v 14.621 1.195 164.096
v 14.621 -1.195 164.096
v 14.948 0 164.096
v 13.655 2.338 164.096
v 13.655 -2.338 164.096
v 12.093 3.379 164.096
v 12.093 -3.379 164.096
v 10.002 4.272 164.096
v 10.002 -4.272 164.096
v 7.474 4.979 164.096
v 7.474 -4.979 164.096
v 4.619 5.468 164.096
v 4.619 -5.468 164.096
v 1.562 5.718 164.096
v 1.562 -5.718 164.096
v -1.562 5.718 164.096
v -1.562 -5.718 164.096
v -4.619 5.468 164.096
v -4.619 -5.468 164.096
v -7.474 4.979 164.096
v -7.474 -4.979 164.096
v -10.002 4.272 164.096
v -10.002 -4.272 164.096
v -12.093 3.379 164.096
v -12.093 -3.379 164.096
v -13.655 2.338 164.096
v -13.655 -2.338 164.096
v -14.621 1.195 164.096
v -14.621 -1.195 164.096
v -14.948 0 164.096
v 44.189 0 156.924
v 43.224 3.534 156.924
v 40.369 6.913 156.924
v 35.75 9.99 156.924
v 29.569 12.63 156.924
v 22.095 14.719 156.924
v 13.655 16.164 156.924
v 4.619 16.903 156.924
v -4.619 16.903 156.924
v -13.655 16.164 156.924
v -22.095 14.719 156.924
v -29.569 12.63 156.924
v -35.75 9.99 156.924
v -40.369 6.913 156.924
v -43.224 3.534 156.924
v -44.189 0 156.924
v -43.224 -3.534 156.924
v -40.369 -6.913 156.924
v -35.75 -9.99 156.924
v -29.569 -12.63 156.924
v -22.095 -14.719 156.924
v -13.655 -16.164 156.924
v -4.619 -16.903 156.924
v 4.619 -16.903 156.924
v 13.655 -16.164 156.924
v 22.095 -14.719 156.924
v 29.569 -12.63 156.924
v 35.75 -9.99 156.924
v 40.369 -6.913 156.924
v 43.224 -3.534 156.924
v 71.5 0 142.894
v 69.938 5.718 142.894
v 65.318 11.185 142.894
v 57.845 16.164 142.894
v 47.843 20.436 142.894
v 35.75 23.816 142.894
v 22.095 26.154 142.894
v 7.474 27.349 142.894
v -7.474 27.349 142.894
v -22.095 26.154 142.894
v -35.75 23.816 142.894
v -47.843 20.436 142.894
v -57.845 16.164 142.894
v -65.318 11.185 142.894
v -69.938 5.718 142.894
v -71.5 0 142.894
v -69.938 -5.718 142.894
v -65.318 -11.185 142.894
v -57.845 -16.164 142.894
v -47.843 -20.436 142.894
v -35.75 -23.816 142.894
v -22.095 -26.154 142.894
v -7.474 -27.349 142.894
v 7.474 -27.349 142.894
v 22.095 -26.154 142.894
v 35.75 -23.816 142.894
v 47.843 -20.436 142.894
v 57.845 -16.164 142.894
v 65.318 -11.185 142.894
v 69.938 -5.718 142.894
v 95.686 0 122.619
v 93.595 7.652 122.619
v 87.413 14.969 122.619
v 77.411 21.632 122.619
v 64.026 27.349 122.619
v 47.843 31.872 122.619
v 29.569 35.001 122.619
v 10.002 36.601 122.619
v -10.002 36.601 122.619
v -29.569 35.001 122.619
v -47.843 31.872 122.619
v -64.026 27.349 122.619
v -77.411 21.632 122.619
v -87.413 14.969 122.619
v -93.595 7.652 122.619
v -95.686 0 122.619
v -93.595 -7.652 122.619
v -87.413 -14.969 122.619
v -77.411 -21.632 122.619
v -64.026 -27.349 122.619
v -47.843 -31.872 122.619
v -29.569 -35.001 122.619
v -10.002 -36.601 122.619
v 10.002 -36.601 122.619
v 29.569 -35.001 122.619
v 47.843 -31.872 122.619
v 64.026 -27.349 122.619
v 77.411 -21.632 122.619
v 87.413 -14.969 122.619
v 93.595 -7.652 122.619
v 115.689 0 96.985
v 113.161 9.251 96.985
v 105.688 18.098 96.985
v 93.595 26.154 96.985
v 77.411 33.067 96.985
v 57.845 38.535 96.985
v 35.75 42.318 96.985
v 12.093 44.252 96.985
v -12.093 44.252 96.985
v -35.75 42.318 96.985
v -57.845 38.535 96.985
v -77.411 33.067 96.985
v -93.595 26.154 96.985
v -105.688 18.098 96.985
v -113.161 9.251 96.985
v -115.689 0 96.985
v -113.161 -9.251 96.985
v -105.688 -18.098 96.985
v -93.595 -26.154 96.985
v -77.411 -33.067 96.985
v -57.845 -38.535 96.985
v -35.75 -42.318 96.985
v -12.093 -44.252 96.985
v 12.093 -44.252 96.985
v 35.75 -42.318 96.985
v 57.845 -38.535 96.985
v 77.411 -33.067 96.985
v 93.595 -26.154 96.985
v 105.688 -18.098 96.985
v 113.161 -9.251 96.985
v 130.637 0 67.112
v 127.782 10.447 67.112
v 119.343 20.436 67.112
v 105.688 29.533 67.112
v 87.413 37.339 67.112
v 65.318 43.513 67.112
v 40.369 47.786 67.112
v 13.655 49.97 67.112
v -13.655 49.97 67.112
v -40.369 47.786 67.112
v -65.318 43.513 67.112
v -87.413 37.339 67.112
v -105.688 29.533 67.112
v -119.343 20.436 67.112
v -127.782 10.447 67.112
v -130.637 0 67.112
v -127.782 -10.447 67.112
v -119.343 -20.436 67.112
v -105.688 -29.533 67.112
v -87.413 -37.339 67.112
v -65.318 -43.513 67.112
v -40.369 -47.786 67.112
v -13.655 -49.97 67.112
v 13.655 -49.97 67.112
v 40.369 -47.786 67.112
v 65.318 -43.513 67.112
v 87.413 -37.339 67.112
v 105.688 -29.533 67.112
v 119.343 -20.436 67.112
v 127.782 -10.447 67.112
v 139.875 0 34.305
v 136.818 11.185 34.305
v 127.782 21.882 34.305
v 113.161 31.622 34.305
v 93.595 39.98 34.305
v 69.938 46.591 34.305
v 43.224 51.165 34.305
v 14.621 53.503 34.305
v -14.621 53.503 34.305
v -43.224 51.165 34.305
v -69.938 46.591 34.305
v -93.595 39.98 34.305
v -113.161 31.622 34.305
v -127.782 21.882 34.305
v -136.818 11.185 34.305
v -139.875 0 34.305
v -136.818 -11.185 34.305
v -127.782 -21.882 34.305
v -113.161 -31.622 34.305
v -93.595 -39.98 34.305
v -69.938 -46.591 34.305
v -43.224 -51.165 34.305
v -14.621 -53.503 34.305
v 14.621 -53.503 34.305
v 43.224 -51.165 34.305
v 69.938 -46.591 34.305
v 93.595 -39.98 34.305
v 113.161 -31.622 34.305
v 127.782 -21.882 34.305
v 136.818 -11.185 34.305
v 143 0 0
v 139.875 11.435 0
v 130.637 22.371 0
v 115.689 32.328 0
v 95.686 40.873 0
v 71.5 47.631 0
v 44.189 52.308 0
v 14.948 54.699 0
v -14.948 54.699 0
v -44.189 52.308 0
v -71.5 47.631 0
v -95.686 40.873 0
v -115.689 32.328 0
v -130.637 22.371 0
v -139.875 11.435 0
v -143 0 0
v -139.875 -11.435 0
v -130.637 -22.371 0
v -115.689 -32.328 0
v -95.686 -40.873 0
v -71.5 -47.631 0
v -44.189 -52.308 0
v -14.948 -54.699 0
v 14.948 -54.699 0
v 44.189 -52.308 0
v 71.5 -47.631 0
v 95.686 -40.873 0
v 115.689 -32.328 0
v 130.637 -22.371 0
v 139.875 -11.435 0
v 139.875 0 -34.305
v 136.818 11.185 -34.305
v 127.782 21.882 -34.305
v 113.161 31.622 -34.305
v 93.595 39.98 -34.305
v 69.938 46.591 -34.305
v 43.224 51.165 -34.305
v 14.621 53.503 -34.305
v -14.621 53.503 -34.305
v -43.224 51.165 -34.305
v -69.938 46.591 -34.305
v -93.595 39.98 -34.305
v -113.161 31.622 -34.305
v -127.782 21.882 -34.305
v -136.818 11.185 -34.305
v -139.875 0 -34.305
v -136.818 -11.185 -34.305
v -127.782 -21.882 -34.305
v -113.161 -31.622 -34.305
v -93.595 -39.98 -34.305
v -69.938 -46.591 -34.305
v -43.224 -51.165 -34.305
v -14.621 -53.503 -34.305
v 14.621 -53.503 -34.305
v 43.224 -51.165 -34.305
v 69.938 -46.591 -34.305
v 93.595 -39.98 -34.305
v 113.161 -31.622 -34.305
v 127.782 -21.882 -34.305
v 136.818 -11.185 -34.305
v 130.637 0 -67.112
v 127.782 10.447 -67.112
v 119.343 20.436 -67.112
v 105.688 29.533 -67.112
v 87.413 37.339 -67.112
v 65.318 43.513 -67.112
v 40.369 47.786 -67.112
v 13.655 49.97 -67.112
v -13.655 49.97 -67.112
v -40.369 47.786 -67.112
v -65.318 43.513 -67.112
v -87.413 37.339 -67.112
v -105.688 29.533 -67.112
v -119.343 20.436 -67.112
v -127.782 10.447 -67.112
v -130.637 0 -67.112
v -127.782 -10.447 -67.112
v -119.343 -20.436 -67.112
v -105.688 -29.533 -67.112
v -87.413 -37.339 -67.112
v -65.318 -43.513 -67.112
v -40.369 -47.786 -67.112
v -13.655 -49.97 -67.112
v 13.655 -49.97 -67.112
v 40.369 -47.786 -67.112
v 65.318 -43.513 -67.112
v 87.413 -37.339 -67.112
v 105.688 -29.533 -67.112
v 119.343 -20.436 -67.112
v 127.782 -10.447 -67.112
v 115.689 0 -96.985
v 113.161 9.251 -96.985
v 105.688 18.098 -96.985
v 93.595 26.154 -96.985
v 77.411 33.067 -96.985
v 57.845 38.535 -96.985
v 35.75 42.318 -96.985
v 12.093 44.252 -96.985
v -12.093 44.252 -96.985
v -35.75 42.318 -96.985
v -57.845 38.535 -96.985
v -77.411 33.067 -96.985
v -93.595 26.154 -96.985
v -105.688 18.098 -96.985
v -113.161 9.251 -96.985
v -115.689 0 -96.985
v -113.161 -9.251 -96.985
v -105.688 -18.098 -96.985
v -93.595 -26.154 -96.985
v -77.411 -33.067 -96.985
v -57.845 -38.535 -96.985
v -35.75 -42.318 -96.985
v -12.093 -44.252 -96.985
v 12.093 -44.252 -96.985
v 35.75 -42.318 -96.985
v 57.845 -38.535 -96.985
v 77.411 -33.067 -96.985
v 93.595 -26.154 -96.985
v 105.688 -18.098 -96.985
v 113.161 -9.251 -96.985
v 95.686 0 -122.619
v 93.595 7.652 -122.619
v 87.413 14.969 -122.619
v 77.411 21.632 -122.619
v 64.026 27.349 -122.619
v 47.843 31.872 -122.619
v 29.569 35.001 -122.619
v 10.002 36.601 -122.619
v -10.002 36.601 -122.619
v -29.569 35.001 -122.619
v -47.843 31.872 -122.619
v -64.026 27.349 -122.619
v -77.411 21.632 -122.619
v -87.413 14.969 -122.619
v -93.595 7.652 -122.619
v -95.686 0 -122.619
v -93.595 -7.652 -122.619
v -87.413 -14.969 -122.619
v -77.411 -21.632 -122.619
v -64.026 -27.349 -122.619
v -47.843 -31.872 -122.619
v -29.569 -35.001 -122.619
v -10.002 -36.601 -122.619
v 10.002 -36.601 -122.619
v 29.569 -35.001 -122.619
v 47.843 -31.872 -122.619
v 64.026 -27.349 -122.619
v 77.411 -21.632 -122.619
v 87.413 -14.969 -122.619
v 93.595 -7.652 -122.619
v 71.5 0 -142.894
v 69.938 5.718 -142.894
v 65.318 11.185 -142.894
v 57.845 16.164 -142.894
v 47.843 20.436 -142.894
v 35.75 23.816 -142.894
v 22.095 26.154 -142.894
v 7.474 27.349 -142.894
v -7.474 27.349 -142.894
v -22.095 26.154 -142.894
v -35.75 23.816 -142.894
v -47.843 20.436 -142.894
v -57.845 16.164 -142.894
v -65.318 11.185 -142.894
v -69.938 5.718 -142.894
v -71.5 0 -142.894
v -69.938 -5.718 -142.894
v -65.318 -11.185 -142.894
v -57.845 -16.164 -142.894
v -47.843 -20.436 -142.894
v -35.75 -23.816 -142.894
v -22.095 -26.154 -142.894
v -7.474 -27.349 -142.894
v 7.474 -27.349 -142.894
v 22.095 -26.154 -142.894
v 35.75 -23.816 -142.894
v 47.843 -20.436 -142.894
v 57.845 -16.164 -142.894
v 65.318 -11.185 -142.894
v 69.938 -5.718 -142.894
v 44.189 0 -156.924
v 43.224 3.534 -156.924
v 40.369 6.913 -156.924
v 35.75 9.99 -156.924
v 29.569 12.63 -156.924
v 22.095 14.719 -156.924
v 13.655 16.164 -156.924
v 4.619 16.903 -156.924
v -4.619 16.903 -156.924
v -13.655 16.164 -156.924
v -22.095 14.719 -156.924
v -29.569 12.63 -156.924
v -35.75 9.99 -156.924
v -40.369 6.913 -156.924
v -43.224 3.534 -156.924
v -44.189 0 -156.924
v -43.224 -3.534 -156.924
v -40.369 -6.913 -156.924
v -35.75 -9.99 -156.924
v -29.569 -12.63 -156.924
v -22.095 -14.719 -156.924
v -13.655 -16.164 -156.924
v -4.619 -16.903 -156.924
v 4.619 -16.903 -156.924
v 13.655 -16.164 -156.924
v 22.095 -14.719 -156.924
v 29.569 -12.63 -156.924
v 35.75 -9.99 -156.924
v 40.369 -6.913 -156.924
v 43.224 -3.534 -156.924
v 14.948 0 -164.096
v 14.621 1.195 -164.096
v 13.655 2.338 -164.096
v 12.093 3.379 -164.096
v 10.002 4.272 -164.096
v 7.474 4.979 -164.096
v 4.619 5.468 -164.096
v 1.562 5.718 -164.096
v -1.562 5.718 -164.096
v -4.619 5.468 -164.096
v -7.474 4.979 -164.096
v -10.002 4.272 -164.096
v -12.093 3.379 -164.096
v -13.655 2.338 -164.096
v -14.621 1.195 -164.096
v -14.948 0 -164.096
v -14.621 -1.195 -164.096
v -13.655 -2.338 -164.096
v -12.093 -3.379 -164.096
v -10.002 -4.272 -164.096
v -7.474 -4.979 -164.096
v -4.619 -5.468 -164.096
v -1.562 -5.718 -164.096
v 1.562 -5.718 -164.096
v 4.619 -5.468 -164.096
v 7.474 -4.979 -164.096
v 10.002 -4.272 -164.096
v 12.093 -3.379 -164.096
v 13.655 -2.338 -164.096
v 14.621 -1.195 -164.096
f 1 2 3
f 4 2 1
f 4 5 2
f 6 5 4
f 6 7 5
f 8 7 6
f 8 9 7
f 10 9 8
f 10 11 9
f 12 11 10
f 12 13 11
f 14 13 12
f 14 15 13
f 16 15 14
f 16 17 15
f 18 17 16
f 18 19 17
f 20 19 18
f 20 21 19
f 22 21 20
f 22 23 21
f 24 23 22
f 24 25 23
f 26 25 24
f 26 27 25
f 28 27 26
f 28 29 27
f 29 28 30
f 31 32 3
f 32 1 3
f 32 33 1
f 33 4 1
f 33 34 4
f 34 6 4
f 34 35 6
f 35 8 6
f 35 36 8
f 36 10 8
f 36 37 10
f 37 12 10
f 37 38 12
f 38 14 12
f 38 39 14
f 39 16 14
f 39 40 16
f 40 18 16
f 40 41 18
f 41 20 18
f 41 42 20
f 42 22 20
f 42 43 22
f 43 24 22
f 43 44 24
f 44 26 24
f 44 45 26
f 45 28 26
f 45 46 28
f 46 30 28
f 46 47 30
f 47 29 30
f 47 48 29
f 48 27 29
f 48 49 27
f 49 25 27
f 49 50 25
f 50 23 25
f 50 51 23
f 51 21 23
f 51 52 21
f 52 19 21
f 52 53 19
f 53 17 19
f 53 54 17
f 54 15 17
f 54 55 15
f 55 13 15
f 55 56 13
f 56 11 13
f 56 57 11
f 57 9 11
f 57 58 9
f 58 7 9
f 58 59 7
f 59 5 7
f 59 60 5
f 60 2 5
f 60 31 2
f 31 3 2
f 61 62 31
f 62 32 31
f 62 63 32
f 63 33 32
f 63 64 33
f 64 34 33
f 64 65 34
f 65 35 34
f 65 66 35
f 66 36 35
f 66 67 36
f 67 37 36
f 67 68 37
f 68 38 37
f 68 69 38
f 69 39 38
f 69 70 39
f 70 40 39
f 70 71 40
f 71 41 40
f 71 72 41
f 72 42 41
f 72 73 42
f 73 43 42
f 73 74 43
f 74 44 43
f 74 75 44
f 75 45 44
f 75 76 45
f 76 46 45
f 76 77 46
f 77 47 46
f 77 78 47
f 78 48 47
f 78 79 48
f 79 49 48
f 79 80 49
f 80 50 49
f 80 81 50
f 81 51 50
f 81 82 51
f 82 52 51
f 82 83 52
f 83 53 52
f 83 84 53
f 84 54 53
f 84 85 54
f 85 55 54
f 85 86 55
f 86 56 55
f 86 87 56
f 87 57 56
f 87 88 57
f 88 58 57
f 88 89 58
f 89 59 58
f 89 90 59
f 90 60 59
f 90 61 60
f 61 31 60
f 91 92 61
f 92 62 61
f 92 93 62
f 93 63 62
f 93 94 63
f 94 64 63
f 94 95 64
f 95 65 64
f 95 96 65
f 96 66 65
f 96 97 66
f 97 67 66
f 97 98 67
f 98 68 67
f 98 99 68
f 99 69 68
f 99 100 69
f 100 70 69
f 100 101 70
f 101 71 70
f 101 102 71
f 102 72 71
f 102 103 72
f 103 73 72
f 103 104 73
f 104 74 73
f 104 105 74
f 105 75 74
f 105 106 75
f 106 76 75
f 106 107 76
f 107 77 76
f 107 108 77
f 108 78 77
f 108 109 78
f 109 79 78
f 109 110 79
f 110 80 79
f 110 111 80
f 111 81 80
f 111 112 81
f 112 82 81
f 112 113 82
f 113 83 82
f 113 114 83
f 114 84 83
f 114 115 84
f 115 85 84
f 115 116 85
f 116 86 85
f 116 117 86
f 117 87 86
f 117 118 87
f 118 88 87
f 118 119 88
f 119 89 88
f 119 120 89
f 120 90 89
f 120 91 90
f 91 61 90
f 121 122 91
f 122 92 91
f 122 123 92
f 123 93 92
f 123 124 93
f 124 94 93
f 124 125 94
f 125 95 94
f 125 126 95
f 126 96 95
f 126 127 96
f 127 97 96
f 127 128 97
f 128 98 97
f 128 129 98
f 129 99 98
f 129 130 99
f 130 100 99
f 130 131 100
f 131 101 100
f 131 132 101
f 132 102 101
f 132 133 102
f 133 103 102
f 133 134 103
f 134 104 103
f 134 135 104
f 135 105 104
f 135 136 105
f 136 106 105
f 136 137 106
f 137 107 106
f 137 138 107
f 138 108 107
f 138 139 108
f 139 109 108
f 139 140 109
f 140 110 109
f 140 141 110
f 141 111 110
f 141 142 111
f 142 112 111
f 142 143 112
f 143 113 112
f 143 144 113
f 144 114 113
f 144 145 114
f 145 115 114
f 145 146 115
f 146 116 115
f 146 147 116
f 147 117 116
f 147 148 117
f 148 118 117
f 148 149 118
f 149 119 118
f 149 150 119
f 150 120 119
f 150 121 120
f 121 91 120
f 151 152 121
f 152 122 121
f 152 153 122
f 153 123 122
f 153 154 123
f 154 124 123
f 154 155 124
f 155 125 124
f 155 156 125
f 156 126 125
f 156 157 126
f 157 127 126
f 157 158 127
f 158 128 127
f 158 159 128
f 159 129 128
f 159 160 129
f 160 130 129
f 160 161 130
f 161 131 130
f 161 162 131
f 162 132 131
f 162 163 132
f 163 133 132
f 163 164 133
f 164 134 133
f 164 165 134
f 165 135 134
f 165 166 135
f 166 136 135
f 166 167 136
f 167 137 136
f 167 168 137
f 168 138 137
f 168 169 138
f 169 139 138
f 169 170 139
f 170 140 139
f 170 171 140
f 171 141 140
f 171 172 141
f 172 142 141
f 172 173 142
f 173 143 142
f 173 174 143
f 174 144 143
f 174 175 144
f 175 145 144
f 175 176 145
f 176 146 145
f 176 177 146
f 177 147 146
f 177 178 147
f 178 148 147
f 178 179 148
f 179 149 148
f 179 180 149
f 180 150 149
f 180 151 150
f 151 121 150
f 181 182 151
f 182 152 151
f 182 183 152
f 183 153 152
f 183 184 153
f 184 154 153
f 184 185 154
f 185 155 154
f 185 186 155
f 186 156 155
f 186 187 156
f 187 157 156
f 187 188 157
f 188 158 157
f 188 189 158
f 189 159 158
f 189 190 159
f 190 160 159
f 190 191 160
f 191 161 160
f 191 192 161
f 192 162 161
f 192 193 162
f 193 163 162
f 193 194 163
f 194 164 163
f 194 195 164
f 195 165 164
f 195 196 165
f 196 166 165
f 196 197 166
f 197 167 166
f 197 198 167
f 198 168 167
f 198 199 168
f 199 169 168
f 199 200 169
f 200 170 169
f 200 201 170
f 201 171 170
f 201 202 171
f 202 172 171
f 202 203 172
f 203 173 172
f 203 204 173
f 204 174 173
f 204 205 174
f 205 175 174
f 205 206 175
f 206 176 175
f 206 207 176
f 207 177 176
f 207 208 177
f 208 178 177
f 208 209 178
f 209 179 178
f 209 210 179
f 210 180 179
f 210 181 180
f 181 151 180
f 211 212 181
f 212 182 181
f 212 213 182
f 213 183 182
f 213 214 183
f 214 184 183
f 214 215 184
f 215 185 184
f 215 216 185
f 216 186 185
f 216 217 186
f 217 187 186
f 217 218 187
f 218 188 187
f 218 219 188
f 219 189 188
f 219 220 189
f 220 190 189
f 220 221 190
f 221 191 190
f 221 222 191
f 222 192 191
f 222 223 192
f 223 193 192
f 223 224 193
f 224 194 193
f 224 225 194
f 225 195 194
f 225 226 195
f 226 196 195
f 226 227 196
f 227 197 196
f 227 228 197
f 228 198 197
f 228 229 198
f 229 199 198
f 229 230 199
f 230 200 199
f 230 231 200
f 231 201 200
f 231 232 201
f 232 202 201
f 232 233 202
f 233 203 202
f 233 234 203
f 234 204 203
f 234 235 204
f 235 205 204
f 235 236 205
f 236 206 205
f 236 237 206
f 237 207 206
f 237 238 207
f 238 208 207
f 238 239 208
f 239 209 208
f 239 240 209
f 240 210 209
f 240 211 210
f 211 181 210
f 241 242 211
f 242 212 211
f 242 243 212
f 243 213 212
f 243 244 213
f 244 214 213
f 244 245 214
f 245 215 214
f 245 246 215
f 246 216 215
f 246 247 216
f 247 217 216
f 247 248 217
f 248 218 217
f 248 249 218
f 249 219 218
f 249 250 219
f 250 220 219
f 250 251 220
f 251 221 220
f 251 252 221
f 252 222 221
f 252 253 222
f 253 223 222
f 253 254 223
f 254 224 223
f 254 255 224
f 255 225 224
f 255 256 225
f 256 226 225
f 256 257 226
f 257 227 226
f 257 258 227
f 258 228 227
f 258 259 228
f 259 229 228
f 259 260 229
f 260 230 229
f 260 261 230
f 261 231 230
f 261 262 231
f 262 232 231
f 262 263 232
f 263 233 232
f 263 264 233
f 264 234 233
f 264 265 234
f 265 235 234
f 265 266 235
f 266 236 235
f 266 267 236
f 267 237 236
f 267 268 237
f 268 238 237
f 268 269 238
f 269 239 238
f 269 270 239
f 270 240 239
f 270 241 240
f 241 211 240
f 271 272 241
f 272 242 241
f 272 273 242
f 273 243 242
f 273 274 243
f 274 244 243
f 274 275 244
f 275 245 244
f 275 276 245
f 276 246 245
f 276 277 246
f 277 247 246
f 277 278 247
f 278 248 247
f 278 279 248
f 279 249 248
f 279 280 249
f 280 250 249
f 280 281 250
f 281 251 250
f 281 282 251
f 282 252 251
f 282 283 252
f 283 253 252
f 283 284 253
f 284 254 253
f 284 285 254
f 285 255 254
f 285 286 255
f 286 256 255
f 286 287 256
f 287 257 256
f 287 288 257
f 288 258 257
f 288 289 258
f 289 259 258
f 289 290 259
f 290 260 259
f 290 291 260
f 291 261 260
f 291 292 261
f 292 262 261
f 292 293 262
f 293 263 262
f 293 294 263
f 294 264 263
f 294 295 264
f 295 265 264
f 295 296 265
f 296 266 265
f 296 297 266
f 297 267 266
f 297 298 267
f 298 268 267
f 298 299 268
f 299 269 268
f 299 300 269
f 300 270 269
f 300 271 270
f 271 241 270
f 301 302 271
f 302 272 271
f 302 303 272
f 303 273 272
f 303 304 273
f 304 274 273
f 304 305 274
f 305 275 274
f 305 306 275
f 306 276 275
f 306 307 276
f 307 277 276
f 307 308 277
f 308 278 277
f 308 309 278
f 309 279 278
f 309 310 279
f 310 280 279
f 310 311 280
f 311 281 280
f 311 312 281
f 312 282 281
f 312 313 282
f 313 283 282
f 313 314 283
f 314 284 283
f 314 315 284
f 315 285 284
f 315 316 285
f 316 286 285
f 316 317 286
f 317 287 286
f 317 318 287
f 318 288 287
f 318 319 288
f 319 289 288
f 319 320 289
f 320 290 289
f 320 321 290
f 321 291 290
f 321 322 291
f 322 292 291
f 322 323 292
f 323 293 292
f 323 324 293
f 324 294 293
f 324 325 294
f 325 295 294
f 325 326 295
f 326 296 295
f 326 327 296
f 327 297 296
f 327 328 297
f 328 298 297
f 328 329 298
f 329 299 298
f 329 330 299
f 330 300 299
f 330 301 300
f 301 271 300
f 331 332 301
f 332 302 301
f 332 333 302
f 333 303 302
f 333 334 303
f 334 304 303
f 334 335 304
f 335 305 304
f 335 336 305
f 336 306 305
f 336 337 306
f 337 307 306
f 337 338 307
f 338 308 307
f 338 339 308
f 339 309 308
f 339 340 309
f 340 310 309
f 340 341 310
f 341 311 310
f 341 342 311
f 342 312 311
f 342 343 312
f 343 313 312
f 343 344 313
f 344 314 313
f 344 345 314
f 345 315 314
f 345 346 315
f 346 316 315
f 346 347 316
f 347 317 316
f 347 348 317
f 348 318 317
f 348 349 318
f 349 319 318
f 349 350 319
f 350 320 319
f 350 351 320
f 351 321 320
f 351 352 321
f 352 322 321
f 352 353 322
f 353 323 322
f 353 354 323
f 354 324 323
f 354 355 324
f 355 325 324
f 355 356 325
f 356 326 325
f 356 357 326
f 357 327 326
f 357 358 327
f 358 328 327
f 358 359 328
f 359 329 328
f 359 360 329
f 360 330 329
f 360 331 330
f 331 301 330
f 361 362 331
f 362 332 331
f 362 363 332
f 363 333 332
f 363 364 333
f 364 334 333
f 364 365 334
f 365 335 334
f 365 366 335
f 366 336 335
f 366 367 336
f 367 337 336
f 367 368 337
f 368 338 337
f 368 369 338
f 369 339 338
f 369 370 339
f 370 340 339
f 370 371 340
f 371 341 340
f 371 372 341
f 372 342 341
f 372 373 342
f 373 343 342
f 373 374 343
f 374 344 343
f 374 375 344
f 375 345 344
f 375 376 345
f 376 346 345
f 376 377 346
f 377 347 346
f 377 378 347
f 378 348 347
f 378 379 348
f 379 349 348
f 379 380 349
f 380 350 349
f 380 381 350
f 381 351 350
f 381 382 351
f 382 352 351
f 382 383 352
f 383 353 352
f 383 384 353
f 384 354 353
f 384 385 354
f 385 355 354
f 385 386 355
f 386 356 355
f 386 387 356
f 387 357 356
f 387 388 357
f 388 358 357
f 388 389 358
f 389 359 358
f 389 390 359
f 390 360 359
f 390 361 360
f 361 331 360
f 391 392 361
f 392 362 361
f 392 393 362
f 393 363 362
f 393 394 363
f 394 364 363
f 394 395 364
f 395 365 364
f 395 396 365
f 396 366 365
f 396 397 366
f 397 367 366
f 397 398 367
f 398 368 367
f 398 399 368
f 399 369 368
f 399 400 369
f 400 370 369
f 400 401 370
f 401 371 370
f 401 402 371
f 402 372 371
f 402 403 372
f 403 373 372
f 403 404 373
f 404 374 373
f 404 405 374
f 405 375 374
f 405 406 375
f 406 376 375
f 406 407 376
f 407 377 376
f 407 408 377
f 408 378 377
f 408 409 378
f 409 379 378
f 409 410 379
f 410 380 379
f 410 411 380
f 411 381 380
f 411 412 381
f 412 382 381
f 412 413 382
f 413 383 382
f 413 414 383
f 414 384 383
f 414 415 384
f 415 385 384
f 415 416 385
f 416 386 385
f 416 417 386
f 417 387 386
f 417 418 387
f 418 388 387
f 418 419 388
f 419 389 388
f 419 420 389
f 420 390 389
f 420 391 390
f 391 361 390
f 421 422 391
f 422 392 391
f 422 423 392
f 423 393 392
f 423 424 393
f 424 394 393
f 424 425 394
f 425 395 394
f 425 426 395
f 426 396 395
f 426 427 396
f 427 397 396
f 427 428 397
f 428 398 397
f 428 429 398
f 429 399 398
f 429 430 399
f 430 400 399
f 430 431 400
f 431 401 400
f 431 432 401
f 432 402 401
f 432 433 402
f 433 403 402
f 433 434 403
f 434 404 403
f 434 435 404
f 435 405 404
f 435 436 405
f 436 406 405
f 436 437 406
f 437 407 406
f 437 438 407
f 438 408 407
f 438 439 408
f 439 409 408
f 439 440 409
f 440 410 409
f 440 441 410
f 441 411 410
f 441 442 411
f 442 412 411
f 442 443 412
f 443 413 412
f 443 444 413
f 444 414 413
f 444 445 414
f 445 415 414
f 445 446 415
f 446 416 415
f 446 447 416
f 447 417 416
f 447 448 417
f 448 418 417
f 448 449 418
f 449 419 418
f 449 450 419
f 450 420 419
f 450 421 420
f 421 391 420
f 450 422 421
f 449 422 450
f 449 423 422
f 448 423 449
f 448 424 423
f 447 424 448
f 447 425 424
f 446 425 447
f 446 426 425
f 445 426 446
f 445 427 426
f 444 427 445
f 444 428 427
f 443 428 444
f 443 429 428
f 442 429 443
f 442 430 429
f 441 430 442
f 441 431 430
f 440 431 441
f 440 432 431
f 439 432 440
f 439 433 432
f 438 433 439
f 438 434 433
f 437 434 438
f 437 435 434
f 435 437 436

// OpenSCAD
// Generated by SolidPython 1.0.1 on 2020-07-29 00:46:50


scale(v = [13, 5, 15]) {
	sphere(r = 11);
}
/***********************************************
*********      SolidPython code:      **********
************************************************
 
# import packages: SolidPython
from solid import *
from solid.utils import *
from itertools import chain, combinations, permutations


class Resize:

    def __init__(self, scad_file):
        self.scad_file = scad_file
        #self.scad_file = import_scad(scad_file)
        # cone/cylinder param:
        self.r1 = 0
        self.r2 = 0
        self.h = 0
        # rectangular prism param:
        self.w = 0
        self.l = 0
        # ellipse param:
        self.r = 0

    # import OpenScad code (file name corresponds to shape)


    # classify shape + parameters
    def assign(self, param1, param2, param3):
        if self.scad_file == 'cone.scad':
            self.r1 = param1
            self.r2 = param2
            self.h = param3
        elif self.scad_file == 'cylinder.scad':
            self.r1 = param1
            self.r2 = param2
            self.h = param3
        elif self.scad_file == 'rectangularPrism.scad':
            self.h = param1
            self.l = param2
            self.w = param3
        else:
            self.r = param1
            self.h = param2

    # resize parameters
    def iterate(self):
        x = range(3, 20, 2)
        i = 1
        if self.scad_file == 'cone.scad':
            tempList = list(permutations(x, 2))
            for temp in tempList:
                param1 = temp[0]
                param2 = temp[1]
                filepath = 'produced_scad_files/' + 'cone' + str(param1) + '_' + str(param2) + '_' + '.scad'
                scad_render_to_file(cylinder(h=param1, r1=param2, r2=0), filepath)

        elif self.scad_file == 'cylinder.scad':
            tempList = list(permutations(x, 3))
            for temp in tempList:
                param1 = temp[0]
                param2 = temp[1]
                filepath = 'produced_scad_files/' + 'cylinder' + str(param1) + '_' + str(param2) + '_' + '.scad'
                scad_render_to_file(cylinder(h=param1, r1=param2, r2=param2), filepath)

        elif self.scad_file == 'rectangularPrism.scad':
            tempList = list(permutations(x, 3))
            for temp in tempList:
                param1 = temp[0]
                param2 = temp[1]
                param3 = temp[2]
                filepath = 'produced_scad_files/' + 'rectangularPrism' + str(param1) + '_' + str(param2) + '_' + str(
                    param3) + '.scad'
                scad_render_to_file(cube(size=(param1, param2, param3)), filepath)

        elif self.scad_file == 'ellipse.scad':
            tempList = list(permutations(x, 4))
            for temp in tempList:
                param1 = temp[0]
                param2 = temp[1]
                param3 = temp[2]
                param4 = temp[3]
                filepath = 'produced_scad_files/' + 'ellipse' + str(param1) + '_' + str(param2) + '_' + str(param3) + '_' + str(param4) + '.scad'
                scad_render_to_file(scale([param1, param2, param3])(sphere(r=param4)), filepath)

    def render_to_scadfile(self):
        scad_render_to_file(scad, 'example.scad') 
 
************************************************/
